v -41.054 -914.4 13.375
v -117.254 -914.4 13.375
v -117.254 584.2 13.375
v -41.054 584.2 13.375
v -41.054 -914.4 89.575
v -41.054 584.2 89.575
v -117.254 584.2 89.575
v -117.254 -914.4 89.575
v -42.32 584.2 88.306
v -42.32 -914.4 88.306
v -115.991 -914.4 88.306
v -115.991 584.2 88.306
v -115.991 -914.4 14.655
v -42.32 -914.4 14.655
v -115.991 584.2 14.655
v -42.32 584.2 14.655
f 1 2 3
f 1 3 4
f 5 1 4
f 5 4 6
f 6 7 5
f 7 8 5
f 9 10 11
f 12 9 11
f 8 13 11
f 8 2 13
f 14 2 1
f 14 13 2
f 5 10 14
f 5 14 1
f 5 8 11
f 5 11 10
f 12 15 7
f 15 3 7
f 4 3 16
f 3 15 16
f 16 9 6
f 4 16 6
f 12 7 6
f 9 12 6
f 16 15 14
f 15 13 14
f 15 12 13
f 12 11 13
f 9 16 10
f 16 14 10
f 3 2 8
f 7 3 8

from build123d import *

# Parameters (mm, degrees)
F0_W     = 76.2
F0_H     = 76.2
F1_DEPTH = 609.6
F3_DEPTH = 914.4
F4_DEPTH = 304.8
F5_DEPTH = 584.2


with BuildPart() as f1:
    # F0 (on Front) → F1 (new body)
    with BuildSketch(Plane.XZ):
        with Locations((-79.1539917648, 51.4746750653)):
            Rectangle(F0_W, F0_H)
    extrude(amount=F1_DEPTH)

    # F2 (on face) → F3 (cut)
    with BuildSketch(Plane.XZ.offset(609.6)):
        Polygon((-42.3204526305, 88.3055701852), (-98.6881405115, 88.3055701852), (-115.9909814596, 88.3055701852), (-115.9909814596, 14.655277133), (-42.3204526305, 14.655277133), align=None)
    extrude(amount=-F3_DEPTH, mode=Mode.SUBTRACT)

    # F4 (add): a face of the model
    f4_faces = [f1.faces().sort_by_distance(p)[0] for p in [
        (-42.1316224993, -609.6, 51.4746750653),
    ]]
    extrude(f4_faces, amount=F4_DEPTH)

    # F5 (add): a face of the model
    f5_faces = [f1.faces().sort_by_distance(p)[0] for p in [
        (-42.1316224993, 0, 51.4746750653),
    ]]
    extrude(f5_faces, amount=F5_DEPTH)


solid = f1.part
